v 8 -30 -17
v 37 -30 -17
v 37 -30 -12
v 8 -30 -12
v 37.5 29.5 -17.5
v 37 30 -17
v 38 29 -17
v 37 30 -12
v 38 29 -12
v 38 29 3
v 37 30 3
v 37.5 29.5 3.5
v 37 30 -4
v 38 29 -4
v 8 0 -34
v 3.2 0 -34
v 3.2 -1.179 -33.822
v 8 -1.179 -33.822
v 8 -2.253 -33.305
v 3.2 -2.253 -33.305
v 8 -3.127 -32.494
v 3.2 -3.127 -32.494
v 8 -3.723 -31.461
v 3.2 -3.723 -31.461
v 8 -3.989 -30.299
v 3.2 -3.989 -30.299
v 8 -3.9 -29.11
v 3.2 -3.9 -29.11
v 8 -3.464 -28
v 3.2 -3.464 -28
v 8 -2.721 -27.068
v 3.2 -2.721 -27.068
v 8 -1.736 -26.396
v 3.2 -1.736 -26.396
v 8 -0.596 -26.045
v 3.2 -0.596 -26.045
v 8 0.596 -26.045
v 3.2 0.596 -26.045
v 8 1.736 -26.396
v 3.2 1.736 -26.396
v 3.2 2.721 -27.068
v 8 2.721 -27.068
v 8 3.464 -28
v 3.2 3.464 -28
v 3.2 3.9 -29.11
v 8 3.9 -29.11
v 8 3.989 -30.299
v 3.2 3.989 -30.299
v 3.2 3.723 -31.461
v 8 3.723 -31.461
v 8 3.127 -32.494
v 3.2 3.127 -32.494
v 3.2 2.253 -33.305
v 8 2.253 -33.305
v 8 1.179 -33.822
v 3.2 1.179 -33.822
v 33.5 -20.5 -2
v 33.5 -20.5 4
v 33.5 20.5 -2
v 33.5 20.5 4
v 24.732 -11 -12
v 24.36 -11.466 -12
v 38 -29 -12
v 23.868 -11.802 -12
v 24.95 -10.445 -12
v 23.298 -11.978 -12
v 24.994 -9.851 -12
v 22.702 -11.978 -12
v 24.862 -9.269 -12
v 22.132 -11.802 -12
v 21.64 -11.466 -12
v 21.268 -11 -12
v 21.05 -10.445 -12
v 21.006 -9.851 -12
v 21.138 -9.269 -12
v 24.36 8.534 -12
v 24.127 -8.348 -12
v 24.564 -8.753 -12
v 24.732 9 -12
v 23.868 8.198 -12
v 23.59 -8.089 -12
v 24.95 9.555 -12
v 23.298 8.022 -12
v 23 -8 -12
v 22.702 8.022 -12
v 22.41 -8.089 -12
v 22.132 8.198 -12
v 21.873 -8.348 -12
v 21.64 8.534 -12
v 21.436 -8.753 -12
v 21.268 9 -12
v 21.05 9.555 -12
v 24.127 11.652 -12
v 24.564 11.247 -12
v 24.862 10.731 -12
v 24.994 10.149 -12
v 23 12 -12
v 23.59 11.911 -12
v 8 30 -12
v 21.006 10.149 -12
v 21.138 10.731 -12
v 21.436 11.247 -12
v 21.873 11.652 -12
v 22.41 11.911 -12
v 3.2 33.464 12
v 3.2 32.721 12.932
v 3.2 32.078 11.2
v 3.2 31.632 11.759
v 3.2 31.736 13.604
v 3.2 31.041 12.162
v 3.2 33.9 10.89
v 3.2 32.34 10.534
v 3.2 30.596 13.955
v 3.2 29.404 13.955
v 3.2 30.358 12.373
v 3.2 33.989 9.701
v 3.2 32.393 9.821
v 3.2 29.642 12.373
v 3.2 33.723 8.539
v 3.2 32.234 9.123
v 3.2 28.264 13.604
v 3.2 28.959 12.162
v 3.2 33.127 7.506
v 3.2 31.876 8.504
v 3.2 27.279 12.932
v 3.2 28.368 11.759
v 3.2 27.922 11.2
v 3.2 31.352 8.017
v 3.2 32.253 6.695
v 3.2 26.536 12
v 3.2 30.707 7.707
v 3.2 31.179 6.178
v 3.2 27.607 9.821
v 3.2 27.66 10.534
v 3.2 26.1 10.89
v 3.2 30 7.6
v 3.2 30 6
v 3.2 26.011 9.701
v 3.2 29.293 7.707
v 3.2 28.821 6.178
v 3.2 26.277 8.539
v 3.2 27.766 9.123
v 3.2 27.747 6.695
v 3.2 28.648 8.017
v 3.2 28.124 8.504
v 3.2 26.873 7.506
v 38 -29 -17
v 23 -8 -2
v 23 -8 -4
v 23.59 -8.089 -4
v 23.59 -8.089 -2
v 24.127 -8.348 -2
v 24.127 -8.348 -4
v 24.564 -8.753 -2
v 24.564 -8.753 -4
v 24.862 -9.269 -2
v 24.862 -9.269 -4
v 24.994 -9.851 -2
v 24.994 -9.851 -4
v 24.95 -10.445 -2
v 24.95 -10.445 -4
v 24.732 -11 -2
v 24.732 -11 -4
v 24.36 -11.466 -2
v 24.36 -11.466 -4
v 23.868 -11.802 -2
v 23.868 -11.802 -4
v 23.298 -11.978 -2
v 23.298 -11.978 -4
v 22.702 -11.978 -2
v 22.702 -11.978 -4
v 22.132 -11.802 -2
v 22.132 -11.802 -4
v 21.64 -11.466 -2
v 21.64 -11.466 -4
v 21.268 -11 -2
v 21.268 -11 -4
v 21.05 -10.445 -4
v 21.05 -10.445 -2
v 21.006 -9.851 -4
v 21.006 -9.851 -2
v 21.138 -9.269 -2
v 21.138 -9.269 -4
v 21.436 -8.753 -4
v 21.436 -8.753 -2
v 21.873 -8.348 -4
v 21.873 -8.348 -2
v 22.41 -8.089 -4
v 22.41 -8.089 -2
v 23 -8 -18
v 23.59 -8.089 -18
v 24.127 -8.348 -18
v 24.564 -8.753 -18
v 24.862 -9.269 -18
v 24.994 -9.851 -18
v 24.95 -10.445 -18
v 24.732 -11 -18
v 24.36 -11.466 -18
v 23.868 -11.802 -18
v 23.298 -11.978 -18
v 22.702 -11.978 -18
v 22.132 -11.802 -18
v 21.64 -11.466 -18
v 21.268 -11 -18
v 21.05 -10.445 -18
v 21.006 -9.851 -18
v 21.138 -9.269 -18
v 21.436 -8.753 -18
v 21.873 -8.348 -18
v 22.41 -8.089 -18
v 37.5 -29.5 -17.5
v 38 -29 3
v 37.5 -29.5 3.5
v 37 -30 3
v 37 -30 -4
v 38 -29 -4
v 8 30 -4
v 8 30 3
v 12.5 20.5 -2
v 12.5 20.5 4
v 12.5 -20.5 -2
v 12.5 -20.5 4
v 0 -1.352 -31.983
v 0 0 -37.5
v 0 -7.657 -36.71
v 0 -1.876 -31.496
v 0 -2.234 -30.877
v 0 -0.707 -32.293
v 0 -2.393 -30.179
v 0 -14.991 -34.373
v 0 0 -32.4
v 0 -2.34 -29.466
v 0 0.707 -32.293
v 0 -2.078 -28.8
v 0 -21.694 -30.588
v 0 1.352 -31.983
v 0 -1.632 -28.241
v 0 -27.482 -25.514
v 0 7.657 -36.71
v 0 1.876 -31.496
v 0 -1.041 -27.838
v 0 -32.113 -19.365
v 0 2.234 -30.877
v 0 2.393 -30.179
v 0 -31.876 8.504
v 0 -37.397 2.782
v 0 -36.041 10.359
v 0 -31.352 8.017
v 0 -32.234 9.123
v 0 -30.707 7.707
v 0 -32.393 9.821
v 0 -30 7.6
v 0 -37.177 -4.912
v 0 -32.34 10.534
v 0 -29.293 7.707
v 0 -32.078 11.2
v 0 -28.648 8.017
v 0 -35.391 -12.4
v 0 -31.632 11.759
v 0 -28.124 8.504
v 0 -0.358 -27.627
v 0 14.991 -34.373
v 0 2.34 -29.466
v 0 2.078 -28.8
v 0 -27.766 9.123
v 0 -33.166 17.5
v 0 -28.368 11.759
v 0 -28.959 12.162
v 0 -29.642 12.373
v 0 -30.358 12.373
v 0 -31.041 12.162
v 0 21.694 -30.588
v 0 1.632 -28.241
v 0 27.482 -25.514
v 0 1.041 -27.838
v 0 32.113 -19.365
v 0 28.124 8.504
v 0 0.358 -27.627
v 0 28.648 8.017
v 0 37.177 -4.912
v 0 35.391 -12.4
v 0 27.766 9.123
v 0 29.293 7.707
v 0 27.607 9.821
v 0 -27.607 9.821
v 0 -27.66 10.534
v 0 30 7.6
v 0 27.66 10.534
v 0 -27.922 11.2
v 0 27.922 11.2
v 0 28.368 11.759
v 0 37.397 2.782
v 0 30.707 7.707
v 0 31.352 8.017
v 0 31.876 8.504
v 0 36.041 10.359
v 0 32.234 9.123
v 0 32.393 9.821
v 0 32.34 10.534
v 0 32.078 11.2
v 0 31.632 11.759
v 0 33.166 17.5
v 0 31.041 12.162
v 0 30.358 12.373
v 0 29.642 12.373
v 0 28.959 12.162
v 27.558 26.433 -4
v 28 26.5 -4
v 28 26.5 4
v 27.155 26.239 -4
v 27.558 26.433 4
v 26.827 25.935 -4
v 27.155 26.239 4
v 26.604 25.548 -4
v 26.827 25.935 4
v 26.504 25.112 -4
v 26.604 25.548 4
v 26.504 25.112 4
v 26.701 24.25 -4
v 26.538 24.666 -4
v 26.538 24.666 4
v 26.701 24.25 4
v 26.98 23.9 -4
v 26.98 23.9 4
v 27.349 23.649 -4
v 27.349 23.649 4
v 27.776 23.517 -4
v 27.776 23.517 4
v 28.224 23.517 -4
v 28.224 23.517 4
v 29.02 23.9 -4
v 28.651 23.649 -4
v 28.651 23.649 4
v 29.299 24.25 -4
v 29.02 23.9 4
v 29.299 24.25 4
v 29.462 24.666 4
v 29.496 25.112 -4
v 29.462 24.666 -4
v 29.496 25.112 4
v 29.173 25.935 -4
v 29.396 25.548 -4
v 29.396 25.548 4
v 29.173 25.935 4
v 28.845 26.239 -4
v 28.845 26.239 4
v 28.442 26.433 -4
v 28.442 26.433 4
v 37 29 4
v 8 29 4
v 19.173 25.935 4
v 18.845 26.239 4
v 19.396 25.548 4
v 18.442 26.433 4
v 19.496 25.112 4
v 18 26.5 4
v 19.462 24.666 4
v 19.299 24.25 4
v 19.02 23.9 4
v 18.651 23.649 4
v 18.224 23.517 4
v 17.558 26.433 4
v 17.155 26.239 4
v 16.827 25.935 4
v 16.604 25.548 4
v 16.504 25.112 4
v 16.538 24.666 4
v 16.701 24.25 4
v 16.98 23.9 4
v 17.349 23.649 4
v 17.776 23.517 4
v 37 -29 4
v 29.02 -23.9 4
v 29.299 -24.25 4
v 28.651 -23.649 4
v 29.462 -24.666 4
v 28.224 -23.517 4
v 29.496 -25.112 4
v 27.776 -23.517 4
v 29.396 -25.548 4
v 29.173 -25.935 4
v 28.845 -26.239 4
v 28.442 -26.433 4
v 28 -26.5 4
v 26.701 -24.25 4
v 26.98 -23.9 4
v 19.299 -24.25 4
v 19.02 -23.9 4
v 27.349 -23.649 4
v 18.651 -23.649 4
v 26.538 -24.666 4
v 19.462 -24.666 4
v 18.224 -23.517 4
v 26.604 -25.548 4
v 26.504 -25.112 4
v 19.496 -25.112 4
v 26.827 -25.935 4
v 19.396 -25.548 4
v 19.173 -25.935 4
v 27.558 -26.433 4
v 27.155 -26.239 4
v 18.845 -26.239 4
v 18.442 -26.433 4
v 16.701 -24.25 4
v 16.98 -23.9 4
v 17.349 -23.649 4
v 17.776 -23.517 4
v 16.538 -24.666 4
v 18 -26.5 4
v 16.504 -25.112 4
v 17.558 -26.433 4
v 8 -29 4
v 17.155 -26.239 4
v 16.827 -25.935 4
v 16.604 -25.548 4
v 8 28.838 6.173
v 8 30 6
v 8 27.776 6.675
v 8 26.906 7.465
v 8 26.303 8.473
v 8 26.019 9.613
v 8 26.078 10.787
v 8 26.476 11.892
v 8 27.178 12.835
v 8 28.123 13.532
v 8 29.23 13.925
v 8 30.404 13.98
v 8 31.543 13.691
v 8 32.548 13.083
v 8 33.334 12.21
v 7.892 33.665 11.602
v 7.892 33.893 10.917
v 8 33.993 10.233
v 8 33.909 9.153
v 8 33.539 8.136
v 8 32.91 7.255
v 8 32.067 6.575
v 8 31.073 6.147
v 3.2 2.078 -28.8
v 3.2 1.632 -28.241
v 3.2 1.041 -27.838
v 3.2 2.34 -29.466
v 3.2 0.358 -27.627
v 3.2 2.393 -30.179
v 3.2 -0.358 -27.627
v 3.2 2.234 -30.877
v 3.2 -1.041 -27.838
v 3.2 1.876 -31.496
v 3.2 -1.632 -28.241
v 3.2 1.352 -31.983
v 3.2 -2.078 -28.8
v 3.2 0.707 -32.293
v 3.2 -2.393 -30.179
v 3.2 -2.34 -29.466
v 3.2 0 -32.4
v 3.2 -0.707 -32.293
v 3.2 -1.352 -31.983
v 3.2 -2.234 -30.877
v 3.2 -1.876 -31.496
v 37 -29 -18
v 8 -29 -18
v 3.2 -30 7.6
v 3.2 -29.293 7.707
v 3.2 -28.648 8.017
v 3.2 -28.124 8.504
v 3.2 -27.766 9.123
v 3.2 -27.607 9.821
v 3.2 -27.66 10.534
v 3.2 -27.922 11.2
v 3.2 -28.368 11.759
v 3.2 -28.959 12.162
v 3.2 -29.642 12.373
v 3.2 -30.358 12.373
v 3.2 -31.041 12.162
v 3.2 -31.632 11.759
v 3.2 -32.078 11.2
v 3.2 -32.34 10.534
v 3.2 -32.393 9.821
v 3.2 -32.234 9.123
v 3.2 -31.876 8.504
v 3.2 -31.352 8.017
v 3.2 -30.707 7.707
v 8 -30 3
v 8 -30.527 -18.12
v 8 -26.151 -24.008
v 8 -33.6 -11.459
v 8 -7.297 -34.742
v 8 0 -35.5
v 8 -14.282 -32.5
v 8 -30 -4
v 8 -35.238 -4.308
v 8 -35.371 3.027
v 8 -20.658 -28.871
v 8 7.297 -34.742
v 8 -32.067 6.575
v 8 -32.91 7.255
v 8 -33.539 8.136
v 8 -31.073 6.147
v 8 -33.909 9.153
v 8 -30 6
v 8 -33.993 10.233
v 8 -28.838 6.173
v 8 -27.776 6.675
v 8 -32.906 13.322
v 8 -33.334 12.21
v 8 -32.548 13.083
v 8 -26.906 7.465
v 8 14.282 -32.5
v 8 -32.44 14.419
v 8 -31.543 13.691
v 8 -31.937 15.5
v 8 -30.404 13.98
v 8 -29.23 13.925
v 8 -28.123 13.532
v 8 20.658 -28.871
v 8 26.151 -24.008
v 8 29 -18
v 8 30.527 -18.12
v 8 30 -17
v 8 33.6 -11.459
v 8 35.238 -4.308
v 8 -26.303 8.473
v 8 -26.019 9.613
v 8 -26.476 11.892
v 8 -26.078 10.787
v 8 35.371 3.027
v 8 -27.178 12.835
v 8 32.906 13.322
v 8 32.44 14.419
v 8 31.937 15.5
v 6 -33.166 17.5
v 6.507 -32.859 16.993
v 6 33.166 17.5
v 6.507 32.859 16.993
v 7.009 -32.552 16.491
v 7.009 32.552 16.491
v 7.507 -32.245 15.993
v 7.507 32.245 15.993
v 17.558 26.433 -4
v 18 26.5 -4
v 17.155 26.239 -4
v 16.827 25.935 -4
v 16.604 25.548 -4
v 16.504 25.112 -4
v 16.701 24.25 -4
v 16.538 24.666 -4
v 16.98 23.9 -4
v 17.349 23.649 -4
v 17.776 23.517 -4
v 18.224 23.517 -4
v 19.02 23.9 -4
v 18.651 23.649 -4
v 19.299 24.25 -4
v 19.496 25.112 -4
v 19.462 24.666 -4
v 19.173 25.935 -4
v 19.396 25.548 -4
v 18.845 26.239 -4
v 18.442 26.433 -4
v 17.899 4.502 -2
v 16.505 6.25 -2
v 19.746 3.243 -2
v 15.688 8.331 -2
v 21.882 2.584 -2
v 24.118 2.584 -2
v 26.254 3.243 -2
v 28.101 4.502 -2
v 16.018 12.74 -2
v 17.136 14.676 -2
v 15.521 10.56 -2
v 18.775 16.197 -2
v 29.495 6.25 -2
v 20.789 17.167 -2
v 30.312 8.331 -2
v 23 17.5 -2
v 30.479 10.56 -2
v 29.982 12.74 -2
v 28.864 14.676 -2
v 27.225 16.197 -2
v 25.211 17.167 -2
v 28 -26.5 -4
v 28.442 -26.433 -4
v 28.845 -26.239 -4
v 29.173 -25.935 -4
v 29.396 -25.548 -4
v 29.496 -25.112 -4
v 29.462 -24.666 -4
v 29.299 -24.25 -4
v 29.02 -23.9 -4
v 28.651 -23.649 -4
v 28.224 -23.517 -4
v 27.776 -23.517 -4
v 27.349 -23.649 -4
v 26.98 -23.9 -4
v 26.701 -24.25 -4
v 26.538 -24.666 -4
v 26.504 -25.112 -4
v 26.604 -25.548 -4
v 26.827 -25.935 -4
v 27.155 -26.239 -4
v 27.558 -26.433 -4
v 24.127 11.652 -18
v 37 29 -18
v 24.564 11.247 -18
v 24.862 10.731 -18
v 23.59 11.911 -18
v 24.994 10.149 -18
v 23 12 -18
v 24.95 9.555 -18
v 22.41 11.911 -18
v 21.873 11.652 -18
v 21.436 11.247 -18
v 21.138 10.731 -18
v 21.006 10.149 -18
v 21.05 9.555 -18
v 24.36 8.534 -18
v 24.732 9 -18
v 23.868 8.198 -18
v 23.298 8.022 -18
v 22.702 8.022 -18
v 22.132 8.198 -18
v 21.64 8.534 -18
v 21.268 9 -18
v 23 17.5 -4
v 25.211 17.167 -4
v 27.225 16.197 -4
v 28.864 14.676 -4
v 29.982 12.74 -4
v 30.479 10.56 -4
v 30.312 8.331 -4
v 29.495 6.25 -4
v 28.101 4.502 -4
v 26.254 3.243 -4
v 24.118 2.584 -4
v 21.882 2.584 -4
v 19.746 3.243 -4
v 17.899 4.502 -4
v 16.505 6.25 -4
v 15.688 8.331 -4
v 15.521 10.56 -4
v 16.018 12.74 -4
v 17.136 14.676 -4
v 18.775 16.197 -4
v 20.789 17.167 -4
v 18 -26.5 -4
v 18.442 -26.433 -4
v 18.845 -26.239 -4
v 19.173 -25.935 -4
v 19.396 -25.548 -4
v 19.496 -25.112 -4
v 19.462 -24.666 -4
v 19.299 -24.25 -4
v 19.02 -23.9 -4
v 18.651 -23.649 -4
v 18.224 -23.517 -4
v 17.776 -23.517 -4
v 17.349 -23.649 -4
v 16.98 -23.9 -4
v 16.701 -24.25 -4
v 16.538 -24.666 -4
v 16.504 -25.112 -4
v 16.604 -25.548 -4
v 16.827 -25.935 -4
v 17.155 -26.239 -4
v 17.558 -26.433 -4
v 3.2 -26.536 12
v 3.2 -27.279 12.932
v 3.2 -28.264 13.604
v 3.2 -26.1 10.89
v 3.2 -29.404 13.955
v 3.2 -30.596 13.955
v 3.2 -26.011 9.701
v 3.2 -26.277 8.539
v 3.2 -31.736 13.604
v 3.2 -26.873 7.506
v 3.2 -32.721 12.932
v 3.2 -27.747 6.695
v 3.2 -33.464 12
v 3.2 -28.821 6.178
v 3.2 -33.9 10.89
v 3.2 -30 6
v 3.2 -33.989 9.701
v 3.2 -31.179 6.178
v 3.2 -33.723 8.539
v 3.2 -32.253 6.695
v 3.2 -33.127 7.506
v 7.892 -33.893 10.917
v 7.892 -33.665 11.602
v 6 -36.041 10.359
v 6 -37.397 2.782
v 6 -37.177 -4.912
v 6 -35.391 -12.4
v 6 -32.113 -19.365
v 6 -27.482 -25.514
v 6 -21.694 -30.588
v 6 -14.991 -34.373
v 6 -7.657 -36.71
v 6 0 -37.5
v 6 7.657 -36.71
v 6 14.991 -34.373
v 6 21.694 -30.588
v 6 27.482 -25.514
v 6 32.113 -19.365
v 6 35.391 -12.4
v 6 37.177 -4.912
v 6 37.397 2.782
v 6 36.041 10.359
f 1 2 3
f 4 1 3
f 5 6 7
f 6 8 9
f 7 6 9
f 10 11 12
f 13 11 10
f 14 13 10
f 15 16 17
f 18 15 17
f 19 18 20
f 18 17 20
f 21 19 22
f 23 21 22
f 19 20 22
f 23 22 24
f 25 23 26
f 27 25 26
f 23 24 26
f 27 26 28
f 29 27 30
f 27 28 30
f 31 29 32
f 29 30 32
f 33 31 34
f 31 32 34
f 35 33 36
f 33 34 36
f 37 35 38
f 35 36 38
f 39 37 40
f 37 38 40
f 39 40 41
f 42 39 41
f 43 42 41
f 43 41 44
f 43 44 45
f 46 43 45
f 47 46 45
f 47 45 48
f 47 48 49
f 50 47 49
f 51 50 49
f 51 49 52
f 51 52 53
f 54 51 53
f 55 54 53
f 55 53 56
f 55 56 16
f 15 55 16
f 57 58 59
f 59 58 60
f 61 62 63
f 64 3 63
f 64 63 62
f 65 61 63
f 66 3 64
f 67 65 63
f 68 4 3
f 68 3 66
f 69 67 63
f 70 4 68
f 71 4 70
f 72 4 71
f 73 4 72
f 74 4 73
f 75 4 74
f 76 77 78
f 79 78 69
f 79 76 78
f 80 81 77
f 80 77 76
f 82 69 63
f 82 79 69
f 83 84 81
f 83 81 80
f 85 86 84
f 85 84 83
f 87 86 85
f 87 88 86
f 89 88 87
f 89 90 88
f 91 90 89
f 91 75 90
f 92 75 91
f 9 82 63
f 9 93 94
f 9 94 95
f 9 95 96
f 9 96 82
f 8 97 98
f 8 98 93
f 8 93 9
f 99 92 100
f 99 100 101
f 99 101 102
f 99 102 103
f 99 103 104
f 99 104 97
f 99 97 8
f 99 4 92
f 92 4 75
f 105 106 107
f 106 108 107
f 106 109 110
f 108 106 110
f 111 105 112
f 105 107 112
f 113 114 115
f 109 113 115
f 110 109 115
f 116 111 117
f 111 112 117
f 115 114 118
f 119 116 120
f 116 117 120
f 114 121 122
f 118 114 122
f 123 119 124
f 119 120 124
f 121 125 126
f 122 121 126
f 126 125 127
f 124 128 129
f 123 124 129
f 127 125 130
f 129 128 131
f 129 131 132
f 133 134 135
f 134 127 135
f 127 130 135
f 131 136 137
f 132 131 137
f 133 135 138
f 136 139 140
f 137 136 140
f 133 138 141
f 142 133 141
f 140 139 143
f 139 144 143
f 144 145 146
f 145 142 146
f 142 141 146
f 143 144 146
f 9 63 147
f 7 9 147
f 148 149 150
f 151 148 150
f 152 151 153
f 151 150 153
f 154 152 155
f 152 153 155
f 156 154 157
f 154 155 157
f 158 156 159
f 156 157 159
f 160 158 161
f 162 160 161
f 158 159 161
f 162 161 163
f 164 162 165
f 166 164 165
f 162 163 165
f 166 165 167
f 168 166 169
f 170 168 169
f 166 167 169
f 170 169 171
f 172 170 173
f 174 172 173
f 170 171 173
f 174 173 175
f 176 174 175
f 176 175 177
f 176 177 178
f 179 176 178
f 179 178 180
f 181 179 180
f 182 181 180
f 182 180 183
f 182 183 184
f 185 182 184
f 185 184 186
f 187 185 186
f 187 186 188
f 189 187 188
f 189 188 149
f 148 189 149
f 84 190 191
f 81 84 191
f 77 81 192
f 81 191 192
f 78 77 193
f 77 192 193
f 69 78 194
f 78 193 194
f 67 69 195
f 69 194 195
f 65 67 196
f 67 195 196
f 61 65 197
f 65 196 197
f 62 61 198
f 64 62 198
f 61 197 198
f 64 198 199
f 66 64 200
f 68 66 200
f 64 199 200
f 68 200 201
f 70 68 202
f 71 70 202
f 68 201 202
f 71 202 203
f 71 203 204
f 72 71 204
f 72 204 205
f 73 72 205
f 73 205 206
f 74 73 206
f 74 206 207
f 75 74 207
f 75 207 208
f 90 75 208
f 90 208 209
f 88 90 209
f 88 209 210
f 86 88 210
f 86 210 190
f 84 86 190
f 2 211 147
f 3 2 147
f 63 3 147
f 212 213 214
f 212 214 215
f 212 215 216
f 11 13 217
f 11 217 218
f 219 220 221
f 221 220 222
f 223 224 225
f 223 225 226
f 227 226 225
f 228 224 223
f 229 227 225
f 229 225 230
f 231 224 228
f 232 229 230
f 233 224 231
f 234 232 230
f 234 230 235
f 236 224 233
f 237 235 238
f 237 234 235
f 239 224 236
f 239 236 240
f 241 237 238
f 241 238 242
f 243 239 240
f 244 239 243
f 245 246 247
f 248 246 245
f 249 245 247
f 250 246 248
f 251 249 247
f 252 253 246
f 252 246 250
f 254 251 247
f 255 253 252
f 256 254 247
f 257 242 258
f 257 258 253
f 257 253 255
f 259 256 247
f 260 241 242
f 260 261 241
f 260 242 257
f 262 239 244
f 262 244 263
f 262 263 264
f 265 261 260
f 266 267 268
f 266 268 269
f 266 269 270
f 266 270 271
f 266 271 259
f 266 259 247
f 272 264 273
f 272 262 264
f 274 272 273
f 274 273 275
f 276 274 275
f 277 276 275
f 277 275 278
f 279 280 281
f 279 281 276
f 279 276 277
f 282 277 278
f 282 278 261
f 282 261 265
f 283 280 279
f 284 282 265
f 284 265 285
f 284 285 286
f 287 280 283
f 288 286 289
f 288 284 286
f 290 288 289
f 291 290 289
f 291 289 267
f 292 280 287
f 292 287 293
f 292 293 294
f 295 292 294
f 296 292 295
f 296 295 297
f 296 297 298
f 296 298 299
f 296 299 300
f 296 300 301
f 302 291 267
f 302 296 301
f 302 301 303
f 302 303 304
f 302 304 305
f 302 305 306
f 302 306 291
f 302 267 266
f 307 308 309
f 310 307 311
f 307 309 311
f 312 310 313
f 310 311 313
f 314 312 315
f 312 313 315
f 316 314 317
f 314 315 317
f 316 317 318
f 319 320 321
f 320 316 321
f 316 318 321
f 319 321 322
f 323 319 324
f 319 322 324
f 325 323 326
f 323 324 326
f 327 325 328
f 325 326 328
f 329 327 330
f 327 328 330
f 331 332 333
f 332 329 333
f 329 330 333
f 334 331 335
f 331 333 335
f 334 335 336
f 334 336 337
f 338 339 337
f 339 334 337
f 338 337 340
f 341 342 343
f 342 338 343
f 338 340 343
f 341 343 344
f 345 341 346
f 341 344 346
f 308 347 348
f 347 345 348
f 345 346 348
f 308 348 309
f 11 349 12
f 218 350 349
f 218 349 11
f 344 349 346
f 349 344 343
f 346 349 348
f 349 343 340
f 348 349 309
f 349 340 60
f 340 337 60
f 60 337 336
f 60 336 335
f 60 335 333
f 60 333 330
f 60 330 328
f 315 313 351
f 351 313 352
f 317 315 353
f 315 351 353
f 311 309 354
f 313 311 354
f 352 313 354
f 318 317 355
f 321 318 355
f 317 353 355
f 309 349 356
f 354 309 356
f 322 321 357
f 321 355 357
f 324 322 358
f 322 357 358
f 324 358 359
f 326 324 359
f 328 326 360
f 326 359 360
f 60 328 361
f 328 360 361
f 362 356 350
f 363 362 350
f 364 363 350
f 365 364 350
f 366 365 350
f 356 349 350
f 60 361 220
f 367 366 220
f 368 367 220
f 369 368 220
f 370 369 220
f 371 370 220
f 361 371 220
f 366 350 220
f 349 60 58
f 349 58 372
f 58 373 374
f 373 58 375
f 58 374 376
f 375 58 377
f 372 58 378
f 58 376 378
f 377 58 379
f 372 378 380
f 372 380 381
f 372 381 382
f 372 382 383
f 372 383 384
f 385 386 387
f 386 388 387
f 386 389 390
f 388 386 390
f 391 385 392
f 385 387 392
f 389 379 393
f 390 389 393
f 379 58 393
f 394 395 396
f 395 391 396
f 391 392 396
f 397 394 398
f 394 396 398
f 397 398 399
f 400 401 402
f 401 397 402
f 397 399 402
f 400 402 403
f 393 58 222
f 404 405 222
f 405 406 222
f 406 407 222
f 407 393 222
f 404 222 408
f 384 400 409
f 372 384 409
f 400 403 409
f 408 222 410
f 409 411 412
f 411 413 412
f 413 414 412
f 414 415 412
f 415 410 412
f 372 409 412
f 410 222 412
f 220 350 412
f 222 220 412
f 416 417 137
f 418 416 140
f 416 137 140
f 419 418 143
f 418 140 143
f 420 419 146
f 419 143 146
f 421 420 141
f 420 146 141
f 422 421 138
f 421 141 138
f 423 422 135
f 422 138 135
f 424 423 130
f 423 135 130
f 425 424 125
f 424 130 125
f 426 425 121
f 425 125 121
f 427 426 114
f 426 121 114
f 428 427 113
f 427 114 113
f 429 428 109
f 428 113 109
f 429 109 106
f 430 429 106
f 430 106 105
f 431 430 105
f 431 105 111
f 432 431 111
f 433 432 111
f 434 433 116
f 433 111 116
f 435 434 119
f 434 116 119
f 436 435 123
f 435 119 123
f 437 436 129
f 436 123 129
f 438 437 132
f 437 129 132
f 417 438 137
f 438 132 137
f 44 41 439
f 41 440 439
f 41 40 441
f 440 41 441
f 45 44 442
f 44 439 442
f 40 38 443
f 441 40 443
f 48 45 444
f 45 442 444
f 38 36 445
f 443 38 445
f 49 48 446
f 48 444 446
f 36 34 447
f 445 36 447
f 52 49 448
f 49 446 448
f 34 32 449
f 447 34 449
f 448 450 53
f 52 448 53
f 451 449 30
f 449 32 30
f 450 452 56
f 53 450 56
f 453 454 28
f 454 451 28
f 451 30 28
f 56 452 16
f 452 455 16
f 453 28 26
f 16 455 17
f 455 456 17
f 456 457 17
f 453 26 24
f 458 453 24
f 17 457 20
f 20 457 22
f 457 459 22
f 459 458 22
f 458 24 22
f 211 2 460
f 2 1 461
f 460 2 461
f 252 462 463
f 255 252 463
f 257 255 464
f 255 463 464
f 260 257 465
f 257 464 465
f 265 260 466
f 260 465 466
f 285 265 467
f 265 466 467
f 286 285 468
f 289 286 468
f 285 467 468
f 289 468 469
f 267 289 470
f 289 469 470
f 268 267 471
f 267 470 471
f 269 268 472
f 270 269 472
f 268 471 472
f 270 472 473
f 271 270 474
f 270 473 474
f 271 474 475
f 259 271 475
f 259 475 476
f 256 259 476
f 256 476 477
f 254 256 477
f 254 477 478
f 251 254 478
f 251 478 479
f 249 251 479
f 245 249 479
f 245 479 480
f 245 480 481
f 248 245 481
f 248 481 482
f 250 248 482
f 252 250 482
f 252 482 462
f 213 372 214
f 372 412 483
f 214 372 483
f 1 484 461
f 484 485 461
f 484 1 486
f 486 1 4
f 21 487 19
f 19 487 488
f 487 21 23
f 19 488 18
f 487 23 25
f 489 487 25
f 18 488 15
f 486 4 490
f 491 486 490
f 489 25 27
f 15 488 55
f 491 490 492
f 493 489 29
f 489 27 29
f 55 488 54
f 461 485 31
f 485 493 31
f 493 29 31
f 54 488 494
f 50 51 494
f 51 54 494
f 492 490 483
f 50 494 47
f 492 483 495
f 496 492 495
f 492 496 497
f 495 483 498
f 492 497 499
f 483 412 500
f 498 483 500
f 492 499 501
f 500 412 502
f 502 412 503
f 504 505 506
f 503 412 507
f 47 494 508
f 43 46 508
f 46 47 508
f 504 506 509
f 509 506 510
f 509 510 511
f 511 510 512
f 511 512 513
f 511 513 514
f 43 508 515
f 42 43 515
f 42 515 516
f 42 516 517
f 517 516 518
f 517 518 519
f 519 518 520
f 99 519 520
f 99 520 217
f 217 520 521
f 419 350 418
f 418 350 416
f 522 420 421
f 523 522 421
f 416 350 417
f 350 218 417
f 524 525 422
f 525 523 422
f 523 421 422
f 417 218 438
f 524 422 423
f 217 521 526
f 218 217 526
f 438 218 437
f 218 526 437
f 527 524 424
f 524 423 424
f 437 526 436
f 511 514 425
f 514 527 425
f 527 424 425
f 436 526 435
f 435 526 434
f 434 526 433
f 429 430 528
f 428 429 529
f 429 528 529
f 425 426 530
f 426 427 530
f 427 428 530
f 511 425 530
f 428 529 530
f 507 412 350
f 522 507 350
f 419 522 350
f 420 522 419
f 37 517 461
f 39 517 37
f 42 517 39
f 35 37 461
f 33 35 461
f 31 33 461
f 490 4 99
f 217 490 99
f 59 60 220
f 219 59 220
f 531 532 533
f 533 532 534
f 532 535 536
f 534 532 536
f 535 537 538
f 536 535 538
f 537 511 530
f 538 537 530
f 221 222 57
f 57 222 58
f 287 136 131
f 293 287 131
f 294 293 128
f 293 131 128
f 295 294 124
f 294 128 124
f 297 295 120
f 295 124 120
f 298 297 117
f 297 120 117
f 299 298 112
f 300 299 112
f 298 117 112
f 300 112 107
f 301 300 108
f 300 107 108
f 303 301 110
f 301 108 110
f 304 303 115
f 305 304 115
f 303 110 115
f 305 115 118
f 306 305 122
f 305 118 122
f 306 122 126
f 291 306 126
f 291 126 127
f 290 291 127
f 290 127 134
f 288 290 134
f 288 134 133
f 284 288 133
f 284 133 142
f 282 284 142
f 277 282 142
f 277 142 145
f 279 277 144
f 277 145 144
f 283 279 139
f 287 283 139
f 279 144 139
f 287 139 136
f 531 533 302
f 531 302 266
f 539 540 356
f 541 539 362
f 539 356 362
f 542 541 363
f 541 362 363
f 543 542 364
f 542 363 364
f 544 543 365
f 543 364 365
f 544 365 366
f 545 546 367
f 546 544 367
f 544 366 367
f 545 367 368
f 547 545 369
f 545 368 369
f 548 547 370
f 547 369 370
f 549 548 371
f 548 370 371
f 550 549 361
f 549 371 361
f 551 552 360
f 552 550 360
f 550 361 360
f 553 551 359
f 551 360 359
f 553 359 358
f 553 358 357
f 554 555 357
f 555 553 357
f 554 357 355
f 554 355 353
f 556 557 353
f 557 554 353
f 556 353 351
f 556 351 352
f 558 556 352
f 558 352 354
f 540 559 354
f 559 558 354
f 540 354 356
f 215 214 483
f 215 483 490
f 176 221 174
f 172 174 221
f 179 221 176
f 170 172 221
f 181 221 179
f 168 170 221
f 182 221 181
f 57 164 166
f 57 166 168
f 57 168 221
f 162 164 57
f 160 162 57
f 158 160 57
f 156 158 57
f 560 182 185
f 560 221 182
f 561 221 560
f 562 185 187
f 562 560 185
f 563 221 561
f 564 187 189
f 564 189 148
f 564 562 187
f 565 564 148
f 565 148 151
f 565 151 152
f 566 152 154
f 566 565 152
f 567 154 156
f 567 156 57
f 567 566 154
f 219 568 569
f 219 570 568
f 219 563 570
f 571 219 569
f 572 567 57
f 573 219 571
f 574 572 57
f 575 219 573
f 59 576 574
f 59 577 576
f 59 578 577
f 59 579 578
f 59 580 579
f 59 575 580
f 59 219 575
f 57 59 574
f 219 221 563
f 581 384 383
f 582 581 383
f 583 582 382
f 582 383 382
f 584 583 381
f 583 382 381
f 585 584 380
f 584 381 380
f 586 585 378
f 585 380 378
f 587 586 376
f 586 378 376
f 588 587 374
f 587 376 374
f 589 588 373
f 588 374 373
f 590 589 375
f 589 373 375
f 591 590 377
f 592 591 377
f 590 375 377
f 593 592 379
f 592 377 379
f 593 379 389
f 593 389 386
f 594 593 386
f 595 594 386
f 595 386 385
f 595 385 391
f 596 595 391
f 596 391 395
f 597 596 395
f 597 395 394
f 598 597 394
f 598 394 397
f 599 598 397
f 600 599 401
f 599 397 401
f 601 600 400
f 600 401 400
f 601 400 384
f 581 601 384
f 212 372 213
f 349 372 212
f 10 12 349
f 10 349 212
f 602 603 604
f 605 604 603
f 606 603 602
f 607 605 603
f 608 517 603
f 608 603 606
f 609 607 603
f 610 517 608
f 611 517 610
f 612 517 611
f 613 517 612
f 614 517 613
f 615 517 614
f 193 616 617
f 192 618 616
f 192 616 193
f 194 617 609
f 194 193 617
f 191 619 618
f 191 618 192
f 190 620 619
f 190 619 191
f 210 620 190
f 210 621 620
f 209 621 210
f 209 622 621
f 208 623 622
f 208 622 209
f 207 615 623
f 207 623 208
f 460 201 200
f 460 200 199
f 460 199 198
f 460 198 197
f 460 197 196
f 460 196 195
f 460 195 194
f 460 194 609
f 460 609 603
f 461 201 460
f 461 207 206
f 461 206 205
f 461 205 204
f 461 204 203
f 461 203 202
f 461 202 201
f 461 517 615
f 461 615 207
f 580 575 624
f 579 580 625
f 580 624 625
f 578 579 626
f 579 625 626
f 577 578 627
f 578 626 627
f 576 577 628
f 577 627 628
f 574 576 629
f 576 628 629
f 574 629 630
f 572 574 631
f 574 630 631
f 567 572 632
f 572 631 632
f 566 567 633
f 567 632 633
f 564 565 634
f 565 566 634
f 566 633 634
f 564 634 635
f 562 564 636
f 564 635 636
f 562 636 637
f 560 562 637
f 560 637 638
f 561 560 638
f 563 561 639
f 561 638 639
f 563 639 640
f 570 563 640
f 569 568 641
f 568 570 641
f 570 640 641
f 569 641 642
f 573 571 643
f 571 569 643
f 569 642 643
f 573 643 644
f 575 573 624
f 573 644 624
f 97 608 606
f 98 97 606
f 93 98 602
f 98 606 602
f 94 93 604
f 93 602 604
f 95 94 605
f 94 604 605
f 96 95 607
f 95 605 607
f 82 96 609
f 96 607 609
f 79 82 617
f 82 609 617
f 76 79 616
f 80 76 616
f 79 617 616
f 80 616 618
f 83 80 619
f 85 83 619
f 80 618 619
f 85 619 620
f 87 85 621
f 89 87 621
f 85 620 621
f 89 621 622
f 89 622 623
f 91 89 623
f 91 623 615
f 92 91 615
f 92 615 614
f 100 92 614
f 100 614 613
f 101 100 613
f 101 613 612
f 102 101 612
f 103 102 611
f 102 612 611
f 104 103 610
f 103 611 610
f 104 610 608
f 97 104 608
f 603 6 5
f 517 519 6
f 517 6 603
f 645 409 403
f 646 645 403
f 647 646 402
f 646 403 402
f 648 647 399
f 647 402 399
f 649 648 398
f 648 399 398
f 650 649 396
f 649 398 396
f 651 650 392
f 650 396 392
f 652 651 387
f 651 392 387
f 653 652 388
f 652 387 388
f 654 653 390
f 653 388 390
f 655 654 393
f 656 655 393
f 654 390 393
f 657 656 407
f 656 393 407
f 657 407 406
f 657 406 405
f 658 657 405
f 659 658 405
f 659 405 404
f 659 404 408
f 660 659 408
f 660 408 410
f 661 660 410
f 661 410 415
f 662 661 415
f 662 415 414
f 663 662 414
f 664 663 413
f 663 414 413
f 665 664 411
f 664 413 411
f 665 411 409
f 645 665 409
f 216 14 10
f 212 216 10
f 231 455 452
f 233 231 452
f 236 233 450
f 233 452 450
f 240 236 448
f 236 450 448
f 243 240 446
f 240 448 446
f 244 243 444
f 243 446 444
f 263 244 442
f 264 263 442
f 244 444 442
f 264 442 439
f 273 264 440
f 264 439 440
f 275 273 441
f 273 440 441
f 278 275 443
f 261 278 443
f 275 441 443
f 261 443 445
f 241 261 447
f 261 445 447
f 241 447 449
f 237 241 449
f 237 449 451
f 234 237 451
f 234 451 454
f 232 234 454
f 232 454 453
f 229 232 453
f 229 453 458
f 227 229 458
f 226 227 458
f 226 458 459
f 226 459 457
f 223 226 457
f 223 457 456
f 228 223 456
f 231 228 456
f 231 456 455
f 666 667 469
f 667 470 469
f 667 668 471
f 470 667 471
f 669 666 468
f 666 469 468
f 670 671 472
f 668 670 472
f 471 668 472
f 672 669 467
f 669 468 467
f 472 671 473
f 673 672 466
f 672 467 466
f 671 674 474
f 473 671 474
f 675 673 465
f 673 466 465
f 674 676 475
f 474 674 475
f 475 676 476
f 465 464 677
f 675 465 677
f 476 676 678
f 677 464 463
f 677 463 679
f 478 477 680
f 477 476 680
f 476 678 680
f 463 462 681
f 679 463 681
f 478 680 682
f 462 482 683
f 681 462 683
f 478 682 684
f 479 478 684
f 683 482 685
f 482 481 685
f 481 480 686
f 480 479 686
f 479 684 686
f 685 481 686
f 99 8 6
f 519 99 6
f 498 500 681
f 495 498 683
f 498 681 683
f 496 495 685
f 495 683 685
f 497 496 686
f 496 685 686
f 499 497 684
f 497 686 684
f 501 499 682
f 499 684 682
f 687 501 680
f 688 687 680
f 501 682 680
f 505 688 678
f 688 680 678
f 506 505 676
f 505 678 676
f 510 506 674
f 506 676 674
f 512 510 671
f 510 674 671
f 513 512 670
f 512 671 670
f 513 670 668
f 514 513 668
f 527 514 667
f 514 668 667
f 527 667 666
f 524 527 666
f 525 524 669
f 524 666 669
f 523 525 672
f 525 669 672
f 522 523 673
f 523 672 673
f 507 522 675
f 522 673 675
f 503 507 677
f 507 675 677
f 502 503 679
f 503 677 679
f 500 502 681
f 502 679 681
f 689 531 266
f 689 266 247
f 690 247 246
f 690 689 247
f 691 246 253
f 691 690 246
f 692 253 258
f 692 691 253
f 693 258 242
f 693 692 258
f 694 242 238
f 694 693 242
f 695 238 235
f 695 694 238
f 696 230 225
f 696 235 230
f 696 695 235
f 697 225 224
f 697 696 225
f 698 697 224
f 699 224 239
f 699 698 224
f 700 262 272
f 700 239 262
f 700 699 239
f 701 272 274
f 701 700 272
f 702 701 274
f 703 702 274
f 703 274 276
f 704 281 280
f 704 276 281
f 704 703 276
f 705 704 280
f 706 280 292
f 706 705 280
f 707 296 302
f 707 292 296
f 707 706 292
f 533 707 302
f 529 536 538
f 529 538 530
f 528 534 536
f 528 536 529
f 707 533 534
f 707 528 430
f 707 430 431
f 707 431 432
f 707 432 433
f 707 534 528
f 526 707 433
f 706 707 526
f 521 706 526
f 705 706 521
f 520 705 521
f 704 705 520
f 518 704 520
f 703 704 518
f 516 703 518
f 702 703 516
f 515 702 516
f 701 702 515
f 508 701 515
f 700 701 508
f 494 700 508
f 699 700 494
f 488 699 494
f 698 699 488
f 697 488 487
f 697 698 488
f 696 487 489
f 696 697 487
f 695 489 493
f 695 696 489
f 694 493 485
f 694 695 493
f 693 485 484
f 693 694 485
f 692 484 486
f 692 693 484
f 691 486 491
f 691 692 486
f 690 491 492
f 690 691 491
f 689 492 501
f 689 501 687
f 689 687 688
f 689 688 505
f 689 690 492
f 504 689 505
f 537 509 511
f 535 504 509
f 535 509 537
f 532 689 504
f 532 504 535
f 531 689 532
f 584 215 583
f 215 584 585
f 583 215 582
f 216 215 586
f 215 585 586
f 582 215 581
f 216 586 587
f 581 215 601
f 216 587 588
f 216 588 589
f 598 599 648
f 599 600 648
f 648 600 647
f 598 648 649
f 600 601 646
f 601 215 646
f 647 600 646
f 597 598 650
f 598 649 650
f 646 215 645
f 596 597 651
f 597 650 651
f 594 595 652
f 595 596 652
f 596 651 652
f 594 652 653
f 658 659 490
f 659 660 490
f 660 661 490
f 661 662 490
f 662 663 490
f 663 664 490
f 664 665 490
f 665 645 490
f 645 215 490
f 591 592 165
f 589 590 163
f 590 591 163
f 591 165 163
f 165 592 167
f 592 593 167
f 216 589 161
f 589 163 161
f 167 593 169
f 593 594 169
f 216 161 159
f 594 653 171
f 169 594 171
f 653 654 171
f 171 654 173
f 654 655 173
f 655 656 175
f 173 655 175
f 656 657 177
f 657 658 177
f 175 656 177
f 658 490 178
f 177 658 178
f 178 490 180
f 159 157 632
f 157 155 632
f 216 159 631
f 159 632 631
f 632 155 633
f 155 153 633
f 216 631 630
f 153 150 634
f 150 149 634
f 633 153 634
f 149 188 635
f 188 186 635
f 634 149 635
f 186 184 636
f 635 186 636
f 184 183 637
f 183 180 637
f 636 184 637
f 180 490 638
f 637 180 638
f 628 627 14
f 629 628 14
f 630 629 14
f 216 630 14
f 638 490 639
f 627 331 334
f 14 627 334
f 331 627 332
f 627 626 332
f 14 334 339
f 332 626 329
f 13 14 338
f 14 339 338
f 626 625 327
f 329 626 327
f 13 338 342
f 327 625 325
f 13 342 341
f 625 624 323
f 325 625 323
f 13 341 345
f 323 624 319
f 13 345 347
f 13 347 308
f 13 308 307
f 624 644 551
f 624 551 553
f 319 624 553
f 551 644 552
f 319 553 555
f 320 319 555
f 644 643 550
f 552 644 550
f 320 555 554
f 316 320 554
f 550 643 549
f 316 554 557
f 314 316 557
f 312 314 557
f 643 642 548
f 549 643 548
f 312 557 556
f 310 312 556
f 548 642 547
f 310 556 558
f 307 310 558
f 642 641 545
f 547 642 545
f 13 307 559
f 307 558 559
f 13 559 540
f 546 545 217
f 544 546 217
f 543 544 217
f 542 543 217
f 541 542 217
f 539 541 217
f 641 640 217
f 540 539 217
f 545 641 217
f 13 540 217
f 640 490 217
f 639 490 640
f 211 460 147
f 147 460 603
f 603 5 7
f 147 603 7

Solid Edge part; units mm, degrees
sketch "Sketch1" plane through (0, 0, 0) normal (0, -1, 0) x (1, 0, 0)
  line L0 (0, 0) -> (0, 37.5)
  line L1 (0, 37.5) -> (6, 37.5)
  line L2 (6, 37.5) -> (8, 35.5)
  line L3 (8, 35.5) -> (8, 0)
  dimension "D1" = 8
  dimension "D2" = 2
revolve "RevolvedProtrusion1" add sketch "Sketch1" angle 360 about axis through (12, 0, 0) along (-1, 0, 0)
sketch "Sketch2" plane through (8, 0, 0) normal (1, 0, 0) x (0, 1, 0)
  line L0 (-30, 4) -> (-30, -4)
  line L1 (-30, -4) -> (30, -4)
  line L2 (30, -4) -> (30, 4)
  line L3 (30, 4) -> (-30, 4)
  line L4 (-30, -12) -> (30, -12)
  line L5 (30, -12) -> (30, -18)
  line L6 (30, -18) -> (-30, -18)
  line L7 (-30, -18) -> (-30, -12)
  dimension "D1" = 8
  dimension "D2" = 6
  dimension "D3" = 8
  dimension "D4" = 4
  dimension "D5" = 60
extrude "Protrusion1" add sketch "Sketch2" along normal blind 30
sketch "Sketch3" plane through (25, 0, 4) normal (0, 0, 1) x (0, 1, 0)
  line L0 (-20.5, -8.5) -> (20.5, -8.5)
  line L1 (20.5, -8.5) -> (20.5, 12.5)
  line L2 (20.5, 12.5) -> (-20.5, 12.5)
  line L3 (-20.5, 12.5) -> (-20.5, -8.5)
  dimension "D1" = 21
  dimension "D2" = 41
extrude "ExtrudedCutout_1" cut sketch "Sketch3" against normal blind 6
hole "Hole_1" at (23, -10, -18) direction (0, 0, 1) diameter 4 end up to next
hole "Hole1" at (23, 10, -18) direction (0, 0, 1) diameter 4 end up to next
sketch "Sketch4" plane through (23, 0, 4) normal (1, 0, 0) x (0, 1, 0)
  line L0 (10, -6) -> (17.5, -6)
  line L1 (17.5, -6) -> (17.5, -8.5)
  line L2 (17.5, -8.5) -> (14, -8.5)
  line L3 (14, -8.5) -> (14, -8)
  line L4 (14, -8) -> (10, -8)
  dimension "D1" = 10
  dimension "D2" = 2.5
  dimension "D3" = 2
revolve "RevolvedCutout1" cut sketch "Sketch4" angle 360 about axis through (23, 10, -2) along (0, 0, 1)
hole "Hole_3" at (18, -25, 4) direction (0, 0, -1) diameter 3 end up to next
hole "Hole2" at (28, -25, 4) direction (0, 0, -1) diameter 3 end up to next
hole "Hole_5" at (8, 0, -30) direction (-1, 0, 0) diameter 4.8 end up to next counterbore diameter 8 counterbore depth 4.8
hole "Hole3" at (8, -30, 10) direction (-1, 0, 0) diameter 4.8 end up to next counterbore diameter 8 counterbore depth 4.8
hole "Hole4" at (8, 30, 10) direction (-1, 0, 0) diameter 4.8 end up to next counterbore diameter 8 counterbore depth 4.8
sketch "Sketch5" plane through (8, 0, 20.75) normal (1, 0, 0) x (0, 1, 0)
  line L0 (-38.8569, 19.7387) -> (38.8569, 19.7387)
  line L1 (38.8569, 19.7387) -> (38.8569, -3.25)
  line L2 (38.8569, -3.25) -> (-38.8569, -3.25)
  line L3 (-38.8569, -3.25) -> (-38.8569, 19.7387)
  dimension "D1" = 17.5
extrude "ExtrudedCutout_2" cut sketch "Sketch5" against normal blind 180
chamfer "Chamfer_1" distance 2 angle 45 1 edges at (8, 0, 17.5)
chamfer "Chamfer_2" distance 1 angle 45 10 edges at (23, -30, -18) (38, 0, -18) (23, 30, -18) (38, 30, -15) (38, 30, 0) (23, 30, 4) (38, 0, 4) (23, -30, 4) (38, -30, 0) (38, -30, -15)
hole "Hole_10" at (23, -10, -4) direction (0, 0, 1) diameter 4 end up to next
mirror "Mirror1" about plane through (0, 0, 0) normal (0, -1, 0) of "Hole_3", "Hole2"
properties material "Polyethylene, low density"
